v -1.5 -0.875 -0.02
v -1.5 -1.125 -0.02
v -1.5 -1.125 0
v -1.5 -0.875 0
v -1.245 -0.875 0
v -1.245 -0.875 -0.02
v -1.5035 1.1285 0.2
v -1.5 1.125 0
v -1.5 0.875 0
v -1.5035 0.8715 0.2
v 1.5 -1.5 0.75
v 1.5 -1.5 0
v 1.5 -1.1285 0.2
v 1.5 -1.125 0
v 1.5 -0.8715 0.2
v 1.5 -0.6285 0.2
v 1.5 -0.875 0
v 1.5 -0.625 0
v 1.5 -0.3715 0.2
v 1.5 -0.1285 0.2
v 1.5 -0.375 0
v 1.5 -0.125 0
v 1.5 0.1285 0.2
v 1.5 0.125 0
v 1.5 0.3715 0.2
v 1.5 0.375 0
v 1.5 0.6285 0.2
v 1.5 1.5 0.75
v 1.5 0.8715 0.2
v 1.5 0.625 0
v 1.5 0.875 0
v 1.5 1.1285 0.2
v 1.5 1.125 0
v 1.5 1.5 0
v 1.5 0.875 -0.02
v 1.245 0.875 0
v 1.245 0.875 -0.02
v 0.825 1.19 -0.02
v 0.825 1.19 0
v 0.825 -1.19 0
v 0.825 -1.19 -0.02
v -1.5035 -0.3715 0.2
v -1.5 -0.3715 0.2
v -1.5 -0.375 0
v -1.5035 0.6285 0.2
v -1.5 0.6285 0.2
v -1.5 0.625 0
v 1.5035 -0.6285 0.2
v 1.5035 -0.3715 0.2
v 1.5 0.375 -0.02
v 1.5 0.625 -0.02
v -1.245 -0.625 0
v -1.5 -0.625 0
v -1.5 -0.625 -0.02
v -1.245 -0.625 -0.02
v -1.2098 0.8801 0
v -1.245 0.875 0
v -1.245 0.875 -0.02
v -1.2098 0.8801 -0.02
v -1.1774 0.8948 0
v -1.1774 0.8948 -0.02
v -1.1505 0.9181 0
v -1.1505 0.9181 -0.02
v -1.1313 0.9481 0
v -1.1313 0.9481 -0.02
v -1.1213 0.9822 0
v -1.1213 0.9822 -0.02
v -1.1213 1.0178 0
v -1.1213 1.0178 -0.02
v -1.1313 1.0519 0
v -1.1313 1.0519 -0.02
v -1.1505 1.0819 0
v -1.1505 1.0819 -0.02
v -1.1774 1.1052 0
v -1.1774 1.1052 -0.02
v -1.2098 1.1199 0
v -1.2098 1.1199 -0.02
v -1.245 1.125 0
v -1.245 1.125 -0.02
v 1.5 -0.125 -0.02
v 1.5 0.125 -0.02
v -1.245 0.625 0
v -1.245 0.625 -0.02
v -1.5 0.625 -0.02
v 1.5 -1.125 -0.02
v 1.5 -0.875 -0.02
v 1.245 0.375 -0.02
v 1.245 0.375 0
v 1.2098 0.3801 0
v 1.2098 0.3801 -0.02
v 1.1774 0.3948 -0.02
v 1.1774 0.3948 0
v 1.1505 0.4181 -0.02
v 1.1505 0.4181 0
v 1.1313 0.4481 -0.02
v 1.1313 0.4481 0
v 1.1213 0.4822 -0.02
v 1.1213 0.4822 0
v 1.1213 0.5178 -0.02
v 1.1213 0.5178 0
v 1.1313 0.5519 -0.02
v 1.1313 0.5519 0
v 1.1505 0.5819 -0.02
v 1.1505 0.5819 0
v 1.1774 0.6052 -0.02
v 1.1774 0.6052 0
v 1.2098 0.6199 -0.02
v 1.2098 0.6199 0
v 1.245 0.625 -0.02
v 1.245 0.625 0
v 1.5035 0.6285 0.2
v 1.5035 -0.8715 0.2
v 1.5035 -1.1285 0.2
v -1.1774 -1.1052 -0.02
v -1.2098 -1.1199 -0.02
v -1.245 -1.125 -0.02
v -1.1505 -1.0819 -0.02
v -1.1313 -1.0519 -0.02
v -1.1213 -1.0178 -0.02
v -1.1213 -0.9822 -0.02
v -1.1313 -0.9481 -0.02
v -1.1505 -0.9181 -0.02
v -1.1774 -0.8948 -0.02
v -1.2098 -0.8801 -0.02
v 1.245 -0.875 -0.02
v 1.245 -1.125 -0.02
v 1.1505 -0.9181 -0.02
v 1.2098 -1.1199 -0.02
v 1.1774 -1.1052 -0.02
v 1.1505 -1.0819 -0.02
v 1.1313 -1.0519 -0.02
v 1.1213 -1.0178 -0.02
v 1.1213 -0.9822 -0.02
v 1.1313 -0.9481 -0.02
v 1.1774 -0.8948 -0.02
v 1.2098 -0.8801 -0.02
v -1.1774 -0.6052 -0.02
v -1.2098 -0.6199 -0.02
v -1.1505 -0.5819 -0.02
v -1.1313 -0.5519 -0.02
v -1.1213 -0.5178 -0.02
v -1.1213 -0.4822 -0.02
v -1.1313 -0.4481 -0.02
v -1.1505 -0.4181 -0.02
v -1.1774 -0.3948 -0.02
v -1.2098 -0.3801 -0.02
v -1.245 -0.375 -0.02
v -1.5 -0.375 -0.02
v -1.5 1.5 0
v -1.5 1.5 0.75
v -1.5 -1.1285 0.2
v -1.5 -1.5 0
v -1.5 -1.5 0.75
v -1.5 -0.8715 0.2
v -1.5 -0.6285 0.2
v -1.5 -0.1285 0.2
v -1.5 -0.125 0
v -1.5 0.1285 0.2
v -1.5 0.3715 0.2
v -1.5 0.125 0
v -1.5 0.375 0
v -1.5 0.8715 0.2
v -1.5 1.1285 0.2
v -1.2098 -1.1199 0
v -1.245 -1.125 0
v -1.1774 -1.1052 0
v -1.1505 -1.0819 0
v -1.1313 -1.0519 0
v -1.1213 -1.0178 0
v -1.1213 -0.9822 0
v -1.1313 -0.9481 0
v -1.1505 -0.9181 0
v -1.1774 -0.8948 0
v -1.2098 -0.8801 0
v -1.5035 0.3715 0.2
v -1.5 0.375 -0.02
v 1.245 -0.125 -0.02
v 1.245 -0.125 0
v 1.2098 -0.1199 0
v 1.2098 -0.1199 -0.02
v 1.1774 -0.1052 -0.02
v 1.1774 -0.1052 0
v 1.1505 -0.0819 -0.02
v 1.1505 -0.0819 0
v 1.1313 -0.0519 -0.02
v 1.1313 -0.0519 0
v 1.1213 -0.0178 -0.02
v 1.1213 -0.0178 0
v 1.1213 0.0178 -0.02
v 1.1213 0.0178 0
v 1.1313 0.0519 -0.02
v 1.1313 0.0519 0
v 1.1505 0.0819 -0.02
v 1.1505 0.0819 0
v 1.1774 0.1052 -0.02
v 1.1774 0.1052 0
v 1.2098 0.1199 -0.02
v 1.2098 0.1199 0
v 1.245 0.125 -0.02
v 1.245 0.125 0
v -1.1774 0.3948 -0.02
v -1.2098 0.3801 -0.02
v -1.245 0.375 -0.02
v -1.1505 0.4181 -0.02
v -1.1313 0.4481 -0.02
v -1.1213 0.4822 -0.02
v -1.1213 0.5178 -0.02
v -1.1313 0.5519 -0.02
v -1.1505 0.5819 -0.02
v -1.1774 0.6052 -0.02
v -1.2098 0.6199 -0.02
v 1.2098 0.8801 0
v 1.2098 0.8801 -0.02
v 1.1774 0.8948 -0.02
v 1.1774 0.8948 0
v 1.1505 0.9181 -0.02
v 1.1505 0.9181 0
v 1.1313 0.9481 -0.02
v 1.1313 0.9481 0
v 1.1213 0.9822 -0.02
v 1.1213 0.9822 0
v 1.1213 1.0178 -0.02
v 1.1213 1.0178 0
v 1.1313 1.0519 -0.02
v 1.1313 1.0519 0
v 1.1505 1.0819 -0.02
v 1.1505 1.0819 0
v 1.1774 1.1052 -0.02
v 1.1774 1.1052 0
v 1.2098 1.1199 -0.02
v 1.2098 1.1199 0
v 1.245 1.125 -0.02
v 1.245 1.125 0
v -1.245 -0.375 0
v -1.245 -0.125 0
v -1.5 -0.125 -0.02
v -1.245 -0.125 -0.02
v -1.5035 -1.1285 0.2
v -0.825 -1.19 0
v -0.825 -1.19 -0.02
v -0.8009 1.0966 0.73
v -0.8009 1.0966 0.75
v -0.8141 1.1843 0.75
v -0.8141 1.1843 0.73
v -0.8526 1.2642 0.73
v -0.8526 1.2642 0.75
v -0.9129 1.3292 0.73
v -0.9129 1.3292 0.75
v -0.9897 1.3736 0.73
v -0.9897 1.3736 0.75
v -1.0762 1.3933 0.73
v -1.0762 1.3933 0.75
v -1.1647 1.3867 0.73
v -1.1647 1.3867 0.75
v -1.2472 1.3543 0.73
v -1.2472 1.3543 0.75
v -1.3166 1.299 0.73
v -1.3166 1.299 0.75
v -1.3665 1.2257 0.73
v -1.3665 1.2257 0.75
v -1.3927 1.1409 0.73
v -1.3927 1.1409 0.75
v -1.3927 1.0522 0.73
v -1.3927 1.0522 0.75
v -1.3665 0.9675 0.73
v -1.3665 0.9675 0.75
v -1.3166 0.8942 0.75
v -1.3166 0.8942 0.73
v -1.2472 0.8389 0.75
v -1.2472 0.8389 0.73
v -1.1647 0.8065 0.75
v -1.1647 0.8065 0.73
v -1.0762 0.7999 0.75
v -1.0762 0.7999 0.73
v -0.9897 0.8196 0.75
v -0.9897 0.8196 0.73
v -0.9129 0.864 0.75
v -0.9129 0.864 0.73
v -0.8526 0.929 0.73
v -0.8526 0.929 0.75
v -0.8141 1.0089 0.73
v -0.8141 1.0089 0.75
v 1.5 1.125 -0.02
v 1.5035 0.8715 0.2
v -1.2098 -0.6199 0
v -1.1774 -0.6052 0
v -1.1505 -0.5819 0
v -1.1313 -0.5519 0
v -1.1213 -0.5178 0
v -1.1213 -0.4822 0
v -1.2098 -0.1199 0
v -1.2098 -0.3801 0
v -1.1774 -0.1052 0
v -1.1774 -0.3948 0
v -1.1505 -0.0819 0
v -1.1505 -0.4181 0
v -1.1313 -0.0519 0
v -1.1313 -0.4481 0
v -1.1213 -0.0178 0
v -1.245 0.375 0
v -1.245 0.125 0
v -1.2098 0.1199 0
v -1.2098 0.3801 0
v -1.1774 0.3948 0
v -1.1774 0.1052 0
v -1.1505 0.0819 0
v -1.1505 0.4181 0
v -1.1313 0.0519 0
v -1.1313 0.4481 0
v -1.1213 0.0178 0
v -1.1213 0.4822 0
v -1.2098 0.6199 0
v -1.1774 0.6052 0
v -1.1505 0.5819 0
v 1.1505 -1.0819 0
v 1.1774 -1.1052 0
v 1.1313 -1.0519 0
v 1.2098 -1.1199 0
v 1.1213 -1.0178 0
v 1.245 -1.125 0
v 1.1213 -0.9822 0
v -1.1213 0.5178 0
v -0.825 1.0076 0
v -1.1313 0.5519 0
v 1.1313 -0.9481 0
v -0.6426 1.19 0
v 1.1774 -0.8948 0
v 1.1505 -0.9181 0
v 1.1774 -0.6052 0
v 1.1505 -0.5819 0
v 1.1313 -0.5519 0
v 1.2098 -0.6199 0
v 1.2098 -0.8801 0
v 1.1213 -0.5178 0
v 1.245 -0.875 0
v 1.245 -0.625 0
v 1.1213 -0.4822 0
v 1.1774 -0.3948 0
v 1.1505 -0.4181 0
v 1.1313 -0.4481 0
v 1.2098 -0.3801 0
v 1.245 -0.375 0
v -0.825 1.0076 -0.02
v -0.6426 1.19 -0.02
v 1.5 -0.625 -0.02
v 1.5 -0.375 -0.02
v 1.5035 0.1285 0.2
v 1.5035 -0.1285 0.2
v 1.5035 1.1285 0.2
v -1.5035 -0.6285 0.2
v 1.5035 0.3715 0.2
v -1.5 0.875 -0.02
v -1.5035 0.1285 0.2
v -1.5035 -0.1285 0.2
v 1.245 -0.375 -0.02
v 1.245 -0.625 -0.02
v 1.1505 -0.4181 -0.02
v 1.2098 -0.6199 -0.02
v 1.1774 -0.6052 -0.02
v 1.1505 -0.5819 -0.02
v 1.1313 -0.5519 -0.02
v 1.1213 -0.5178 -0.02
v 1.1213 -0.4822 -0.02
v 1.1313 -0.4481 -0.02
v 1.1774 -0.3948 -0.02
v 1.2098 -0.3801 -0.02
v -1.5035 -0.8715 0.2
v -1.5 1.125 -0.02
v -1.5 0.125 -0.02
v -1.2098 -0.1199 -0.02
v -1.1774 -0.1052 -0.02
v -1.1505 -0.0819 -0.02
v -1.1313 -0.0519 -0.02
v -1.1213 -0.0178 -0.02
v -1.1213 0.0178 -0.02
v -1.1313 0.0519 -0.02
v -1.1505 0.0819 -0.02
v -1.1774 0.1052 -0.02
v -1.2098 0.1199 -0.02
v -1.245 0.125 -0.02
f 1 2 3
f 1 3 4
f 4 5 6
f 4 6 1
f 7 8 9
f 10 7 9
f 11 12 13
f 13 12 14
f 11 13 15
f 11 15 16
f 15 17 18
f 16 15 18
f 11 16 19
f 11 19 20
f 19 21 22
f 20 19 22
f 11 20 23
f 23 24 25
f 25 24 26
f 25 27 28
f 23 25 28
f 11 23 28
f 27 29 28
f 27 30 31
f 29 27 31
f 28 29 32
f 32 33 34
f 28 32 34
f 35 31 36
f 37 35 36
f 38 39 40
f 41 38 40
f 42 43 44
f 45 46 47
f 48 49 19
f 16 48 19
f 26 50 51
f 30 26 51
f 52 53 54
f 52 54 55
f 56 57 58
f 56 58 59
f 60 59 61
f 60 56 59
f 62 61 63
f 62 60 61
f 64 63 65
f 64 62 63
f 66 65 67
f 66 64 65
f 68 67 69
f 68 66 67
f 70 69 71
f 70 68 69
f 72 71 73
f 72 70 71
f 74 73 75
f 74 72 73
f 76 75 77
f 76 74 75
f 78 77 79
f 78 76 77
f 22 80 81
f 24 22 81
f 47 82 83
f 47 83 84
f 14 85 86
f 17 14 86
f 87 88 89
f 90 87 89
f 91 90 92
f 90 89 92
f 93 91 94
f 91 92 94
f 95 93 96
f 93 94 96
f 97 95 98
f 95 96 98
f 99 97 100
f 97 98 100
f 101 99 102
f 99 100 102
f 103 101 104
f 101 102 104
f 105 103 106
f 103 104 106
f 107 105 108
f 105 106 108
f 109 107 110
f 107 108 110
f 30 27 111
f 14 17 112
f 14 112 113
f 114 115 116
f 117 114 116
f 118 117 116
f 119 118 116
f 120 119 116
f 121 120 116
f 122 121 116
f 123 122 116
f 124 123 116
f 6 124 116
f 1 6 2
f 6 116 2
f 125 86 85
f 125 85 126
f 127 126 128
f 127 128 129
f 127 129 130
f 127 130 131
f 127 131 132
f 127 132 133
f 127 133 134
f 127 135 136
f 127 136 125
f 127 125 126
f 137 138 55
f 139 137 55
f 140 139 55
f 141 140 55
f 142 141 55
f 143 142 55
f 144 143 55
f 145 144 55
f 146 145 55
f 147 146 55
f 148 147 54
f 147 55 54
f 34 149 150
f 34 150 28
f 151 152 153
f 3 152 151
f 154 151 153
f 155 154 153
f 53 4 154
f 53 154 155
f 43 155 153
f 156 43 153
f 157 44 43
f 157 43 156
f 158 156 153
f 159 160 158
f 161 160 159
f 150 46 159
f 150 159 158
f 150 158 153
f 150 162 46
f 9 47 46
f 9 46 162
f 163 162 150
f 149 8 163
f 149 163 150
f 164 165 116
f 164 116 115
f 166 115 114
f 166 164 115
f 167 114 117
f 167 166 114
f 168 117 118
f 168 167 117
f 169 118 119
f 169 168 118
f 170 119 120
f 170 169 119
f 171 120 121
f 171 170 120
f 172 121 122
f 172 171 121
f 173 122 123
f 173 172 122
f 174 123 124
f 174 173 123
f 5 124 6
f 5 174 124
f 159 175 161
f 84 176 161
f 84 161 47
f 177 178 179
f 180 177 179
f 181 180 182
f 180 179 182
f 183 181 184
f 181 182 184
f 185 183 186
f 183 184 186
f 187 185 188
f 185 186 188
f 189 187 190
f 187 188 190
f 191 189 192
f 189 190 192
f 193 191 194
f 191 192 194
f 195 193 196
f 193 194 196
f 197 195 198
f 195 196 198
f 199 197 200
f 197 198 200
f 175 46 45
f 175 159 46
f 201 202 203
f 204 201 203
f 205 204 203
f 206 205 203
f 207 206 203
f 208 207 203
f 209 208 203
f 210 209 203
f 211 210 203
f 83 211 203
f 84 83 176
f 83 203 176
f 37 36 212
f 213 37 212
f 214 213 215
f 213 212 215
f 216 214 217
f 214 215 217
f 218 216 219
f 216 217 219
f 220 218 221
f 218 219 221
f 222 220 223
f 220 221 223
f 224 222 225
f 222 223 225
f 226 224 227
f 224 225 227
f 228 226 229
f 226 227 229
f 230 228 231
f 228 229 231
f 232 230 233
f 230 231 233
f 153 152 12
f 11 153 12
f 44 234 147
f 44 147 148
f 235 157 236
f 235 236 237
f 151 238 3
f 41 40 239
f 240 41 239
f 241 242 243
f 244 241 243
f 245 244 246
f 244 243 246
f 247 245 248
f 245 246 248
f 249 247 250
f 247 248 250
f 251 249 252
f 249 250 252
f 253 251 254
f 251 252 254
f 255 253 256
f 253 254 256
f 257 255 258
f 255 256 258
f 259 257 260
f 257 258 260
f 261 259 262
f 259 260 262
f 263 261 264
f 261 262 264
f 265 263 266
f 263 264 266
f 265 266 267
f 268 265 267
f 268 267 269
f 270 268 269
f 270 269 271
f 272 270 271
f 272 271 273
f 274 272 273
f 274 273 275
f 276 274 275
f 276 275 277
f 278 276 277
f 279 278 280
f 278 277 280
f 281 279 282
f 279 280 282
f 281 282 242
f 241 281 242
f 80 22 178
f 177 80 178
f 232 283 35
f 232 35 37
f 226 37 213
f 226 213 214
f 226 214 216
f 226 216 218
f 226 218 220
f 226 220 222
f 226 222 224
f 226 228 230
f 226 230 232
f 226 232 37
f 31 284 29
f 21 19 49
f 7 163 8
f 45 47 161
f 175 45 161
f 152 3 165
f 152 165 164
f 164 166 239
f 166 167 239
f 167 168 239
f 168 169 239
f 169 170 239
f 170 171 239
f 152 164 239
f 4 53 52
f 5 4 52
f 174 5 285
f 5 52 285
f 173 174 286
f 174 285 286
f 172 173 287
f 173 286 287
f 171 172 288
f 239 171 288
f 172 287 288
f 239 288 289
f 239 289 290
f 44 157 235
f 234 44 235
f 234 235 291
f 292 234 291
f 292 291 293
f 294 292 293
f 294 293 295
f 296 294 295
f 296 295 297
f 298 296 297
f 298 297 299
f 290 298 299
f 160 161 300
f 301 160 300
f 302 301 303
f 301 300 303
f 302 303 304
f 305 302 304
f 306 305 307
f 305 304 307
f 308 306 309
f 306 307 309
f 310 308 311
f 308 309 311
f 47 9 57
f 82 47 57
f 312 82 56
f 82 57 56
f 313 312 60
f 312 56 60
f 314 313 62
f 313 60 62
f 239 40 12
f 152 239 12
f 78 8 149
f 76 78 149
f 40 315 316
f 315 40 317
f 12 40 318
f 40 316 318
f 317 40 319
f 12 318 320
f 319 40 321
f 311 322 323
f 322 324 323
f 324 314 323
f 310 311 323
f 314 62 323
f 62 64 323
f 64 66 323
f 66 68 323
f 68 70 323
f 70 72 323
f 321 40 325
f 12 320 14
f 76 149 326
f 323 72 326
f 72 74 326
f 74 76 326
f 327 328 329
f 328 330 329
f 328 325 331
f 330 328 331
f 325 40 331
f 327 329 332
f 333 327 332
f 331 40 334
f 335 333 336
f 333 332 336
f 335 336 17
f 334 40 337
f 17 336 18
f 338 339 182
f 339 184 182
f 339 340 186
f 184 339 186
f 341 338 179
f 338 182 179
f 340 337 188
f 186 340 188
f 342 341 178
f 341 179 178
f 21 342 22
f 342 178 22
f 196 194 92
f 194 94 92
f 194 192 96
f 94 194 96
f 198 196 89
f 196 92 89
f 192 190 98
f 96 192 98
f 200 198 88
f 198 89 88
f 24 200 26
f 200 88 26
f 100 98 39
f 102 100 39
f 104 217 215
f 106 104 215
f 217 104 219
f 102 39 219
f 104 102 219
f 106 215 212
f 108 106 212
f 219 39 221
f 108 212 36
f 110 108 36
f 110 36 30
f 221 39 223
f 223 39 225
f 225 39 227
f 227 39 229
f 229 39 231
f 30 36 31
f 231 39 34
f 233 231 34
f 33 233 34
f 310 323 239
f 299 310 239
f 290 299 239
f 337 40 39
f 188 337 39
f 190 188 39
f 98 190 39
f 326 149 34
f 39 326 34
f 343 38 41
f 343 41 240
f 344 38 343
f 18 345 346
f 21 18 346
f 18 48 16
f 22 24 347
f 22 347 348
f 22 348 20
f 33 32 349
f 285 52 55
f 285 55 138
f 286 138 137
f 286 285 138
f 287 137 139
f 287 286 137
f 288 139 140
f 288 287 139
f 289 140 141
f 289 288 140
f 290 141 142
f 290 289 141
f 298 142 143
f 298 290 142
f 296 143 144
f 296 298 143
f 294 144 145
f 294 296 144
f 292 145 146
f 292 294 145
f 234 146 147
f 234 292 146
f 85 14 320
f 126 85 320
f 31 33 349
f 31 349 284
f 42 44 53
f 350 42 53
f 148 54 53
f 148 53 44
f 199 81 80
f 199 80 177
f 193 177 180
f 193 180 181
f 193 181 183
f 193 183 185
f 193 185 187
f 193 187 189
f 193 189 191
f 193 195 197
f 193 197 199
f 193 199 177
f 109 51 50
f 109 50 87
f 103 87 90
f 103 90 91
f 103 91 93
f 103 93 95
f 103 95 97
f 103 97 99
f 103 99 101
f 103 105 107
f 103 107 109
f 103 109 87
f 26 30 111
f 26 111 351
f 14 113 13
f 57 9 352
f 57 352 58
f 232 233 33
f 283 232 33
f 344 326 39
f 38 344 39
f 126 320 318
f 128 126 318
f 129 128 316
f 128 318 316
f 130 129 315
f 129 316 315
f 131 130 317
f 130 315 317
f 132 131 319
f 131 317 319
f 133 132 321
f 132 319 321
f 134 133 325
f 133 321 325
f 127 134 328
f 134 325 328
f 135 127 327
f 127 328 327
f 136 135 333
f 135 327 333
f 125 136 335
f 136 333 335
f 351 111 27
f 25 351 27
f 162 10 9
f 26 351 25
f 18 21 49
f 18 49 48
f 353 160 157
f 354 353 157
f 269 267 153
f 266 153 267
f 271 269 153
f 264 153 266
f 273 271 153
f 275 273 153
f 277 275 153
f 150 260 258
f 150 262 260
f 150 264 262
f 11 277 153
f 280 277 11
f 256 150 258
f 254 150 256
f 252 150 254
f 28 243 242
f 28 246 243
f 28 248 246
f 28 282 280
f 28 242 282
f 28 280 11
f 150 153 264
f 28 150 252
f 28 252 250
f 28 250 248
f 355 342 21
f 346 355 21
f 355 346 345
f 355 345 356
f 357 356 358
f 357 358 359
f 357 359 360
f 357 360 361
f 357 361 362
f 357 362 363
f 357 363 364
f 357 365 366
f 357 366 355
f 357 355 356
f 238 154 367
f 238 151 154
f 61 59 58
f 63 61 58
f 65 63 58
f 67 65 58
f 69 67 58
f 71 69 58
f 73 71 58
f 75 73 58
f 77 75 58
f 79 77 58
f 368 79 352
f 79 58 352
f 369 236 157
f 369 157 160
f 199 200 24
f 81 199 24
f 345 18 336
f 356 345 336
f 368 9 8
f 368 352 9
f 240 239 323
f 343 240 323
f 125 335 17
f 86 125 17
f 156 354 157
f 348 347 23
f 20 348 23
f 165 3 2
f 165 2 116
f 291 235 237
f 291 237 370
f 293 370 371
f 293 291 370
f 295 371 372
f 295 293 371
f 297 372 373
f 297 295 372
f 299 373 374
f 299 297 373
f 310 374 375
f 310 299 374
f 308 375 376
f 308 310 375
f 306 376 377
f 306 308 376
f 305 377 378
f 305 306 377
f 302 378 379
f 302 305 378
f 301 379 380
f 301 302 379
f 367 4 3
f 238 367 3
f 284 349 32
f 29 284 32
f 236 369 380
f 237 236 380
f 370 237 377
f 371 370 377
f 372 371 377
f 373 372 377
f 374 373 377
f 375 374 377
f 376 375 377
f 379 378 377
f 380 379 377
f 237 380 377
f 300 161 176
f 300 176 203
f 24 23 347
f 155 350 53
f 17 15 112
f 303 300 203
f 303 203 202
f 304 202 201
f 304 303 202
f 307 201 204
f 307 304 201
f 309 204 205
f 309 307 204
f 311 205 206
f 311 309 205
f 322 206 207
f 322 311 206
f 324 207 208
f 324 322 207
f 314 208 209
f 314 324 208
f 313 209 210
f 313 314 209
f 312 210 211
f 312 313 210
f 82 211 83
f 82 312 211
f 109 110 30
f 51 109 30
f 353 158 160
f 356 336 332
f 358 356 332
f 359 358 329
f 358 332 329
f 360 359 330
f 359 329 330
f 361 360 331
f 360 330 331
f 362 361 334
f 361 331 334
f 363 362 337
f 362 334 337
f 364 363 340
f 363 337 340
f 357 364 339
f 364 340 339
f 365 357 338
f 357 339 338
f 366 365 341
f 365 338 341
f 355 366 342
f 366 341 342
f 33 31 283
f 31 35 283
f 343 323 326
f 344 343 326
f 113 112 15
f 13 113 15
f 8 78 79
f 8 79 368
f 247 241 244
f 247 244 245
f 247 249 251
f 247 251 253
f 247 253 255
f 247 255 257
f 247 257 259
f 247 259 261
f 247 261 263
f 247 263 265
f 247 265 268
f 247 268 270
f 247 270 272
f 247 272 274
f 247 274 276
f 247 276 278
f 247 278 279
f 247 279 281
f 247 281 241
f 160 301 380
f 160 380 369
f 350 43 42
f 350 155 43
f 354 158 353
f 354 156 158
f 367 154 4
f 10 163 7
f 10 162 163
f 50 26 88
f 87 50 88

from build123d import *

# Parameters (mm, degrees)
SKETCH1_W                     = 3
SKETCH1_H                     = 3
BOSS_EXTRUDE1_DEPTH           = 0.75
SKETCH2_R                     = 0.297554852
CUT_EXTRUDE1_DEPTH            = 0.02
BOSS_EXTRUDE2_DEPTH           = 0.02
BOSS_EXTRUDE3_DEPTH           = 0.02
BOSS_EXTRUDE3_OTHER_WAY_DEPTH = 0.2
BOSS_EXTRUDE3_OTHER_WAY_DRAFT = 1
LPATTERN2_COUNT               = 3
LPATTERN2_PITCH               = 0.5
LPATTERN2_COPY_1_DEPTH        = 0.2
LPATTERN2_COPY_1_DRAFT        = 1
LPATTERN2_COPY_2_DEPTH        = 0.2
LPATTERN2_COPY_2_DRAFT        = 1
LPATTERN2_COPY_3_DEPTH        = 0.2
LPATTERN2_COPY_3_DRAFT        = 1
LPATTERN2_COPY_4_DEPTH        = 0.2
LPATTERN2_COPY_4_DRAFT        = 1
LPATTERN2_COL_COUNT           = 3
LPATTERN2_COL_PITCH           = 0.5
LPATTERN2_COL_COPY_1_DEPTH    = 0.2
LPATTERN2_COL_COPY_1_DRAFT    = 1
LPATTERN2_COL_COPY_2_DEPTH    = 0.2
LPATTERN2_COL_COPY_2_DRAFT    = 1
LPATTERN2_COL_COPY_3_DEPTH    = 0.2
LPATTERN2_COL_COPY_3_DRAFT    = 1
LPATTERN2_COL_COPY_4_DEPTH    = 0.2
LPATTERN2_COL_COPY_4_DRAFT    = 1
MIRROR1_COPY_1_DEPTH          = 0.2
MIRROR1_COPY_1_DRAFT          = 1
MIRROR1_COPY_2_DEPTH          = 0.2
MIRROR1_COPY_2_DRAFT          = 1
MIRROR1_COPY_3_DEPTH          = 0.02
MIRROR1_COPY_4_DEPTH          = 0.02
MIRROR1_COPY_5_DEPTH          = 0.2
MIRROR1_COPY_5_DRAFT          = 1
MIRROR1_COPY_6_DEPTH          = 0.2
MIRROR1_COPY_6_DRAFT          = 1
MIRROR1_COPY_7_DEPTH          = 0.2
MIRROR1_COPY_7_DRAFT          = 1
MIRROR1_COPY_8_DEPTH          = 0.2
MIRROR1_COPY_8_DRAFT          = 1
MIRROR1_COPY_9_DEPTH          = 0.02
MIRROR1_COPY_10_DEPTH         = 0.02
MIRROR1_COPY_11_DEPTH         = 0.2
MIRROR1_COPY_11_DRAFT         = 1
MIRROR1_COPY_12_DEPTH         = 0.2
MIRROR1_COPY_12_DRAFT         = 1
MIRROR1_COPY_13_DEPTH         = 0.2
MIRROR1_COPY_13_DRAFT         = 1
MIRROR1_COPY_14_DEPTH         = 0.2
MIRROR1_COPY_14_DRAFT         = 1
MIRROR1_COPY_15_DEPTH         = 0.2
MIRROR1_COPY_15_DRAFT         = 1


with BuildPart() as part:
    # Sketch1 → Boss-Extrude1 (new body)
    with BuildSketch(Plane.XY):
        Rectangle(SKETCH1_W, SKETCH1_H)
    extrude(amount=BOSS_EXTRUDE1_DEPTH)

    # Sketch2 → Cut-Extrude1 (cut)
    with BuildSketch(Plane.XY.offset(0.75)):
        with Locations((-1.098438597, 1.096593323)):
            Circle(SKETCH2_R)
    extrude(amount=-CUT_EXTRUDE1_DEPTH, mode=Mode.SUBTRACT)

    # Sketch3 → Boss-Extrude2 (add)
    with BuildSketch(Plane(origin=(0, 0, 0), x_dir=(-1, 0, 0), z_dir=(0, 0, -1))):
        Polygon((0.825, 1.007619321), (0.642619321, 1.19), (-0.825, 1.19), (-0.825, -1.19), (0.825, -1.19), align=None)
    extrude(amount=BOSS_EXTRUDE2_DEPTH)

    # Sketch4 → Boss-Extrude3 (add)
    with BuildSketch(Plane(origin=(0, 0, 0), x_dir=(-1, 0, 0), z_dir=(0, 0, -1))):
        with BuildLine():
            Line((-1.5, 0.125), (-1.5, -0.125))
            Line((-1.5, -0.125), (-1.245, -0.125))
            ThreePointArc((-1.245, -0.125), (-1.12, 0), (-1.245, 0.125))
            Line((-1.245, 0.125), (-1.5, 0.125))
        make_face()
    boss_extrude3 = extrude(amount=BOSS_EXTRUDE3_DEPTH)


with BuildPart() as boss_extrude3_other_way_tool:
    # Sketch4 → Boss-Extrude3 other way (with draft: the straight prism first)
    with BuildSketch(Plane(origin=(0, 0, 0), x_dir=(-1, 0, 0), z_dir=(0, 0, -1))):
        with BuildLine():
            Line((-1.5, 0.125), (-1.5, -0.125))
            Line((-1.5, -0.125), (-1.245, -0.125))
            ThreePointArc((-1.245, -0.125), (-1.12, 0), (-1.245, 0.125))
            Line((-1.245, 0.125), (-1.5, 0.125))
        make_face()
    extrude(amount=-BOSS_EXTRUDE3_OTHER_WAY_DEPTH)
    # Boss-Extrude3 other way: the draft: its side faces are tilted about the plane it starts from
    boss_extrude3_other_way_sides = [boss_extrude3_other_way_tool.faces().sort_by_distance(p)[0] for p in [
        (1.3725, 0.125, 0.1),
        (1.5, 0, 0.1),
        (1.3725, -0.125, 0.1),
        (1.12, 0, 0.1),
    ]]
    draft(boss_extrude3_other_way_sides, Plane(origin=(0, 0, 0), x_dir=(-1, 0, 0), z_dir=(0, 0, -1)), BOSS_EXTRUDE3_OTHER_WAY_DRAFT)


with BuildPart() as part_1:
    add(part.part)

    # Boss-Extrude3 other way: add boss_extrude3_other_way_tool
    add(boss_extrude3_other_way_tool.part)

    # LPattern2: Boss-Extrude3 ×3
    with Locations(*[(0, i * LPATTERN2_PITCH, 0) for i in range(1, LPATTERN2_COUNT)]):
        add(boss_extrude3)


with BuildPart() as lpattern2_copy_1_tool:
    # LPattern2 copy 1 sketch → LPattern2 copy 1 (with draft: the straight prism first)
    with BuildSketch(Plane(origin=(0, 0.5, 0), x_dir=(-1, 0, 0), z_dir=(0, 0, -1))):
        with BuildLine():
            Line((-1.5, 0.125), (-1.5, -0.125))
            Line((-1.5, -0.125), (-1.245, -0.125))
            ThreePointArc((-1.245, -0.125), (-1.12, 0), (-1.245, 0.125))
            Line((-1.245, 0.125), (-1.5, 0.125))
        make_face()
    extrude(amount=-LPATTERN2_COPY_1_DEPTH)
    # LPattern2 copy 1: the draft: its side faces are tilted about the plane it starts from
    lpattern2_copy_1_sides = [lpattern2_copy_1_tool.faces().sort_by_distance(p)[0] for p in [
        (1.3725, 0.625, 0.1),
        (1.5, 0.5, 0.1),
        (1.3725, 0.375, 0.1),
        (1.12, 0.5, 0.1),
    ]]
    draft(lpattern2_copy_1_sides, Plane(origin=(0, 0.5, 0), x_dir=(-1, 0, 0), z_dir=(0, 0, -1)), LPATTERN2_COPY_1_DRAFT)


with BuildPart() as part_2:
    add(part_1.part)

    # LPattern2 copy 1: add lpattern2_copy_1_tool
    add(lpattern2_copy_1_tool.part)


with BuildPart() as lpattern2_copy_2_tool:
    # LPattern2 copy 2 sketch → LPattern2 copy 2 (with draft: the straight prism first)
    with BuildSketch(Plane(origin=(0, 1, 0), x_dir=(-1, 0, 0), z_dir=(0, 0, -1))):
        with BuildLine():
            Line((-1.5, 0.125), (-1.5, -0.125))
            Line((-1.5, -0.125), (-1.245, -0.125))
            ThreePointArc((-1.245, -0.125), (-1.12, 0), (-1.245, 0.125))
            Line((-1.245, 0.125), (-1.5, 0.125))
        make_face()
    extrude(amount=-LPATTERN2_COPY_2_DEPTH)
    # LPattern2 copy 2: the draft: its side faces are tilted about the plane it starts from
    lpattern2_copy_2_sides = [lpattern2_copy_2_tool.faces().sort_by_distance(p)[0] for p in [
        (1.3725, 1.125, 0.1),
        (1.5, 1, 0.1),
        (1.3725, 0.875, 0.1),
        (1.12, 1, 0.1),
    ]]
    draft(lpattern2_copy_2_sides, Plane(origin=(0, 1, 0), x_dir=(-1, 0, 0), z_dir=(0, 0, -1)), LPATTERN2_COPY_2_DRAFT)


with BuildPart() as part_3:
    add(part_2.part)

    # LPattern2 copy 2: add lpattern2_copy_2_tool
    add(lpattern2_copy_2_tool.part)


with BuildPart() as lpattern2_copy_3_tool:
    # LPattern2 copy 3 sketch → LPattern2 copy 3 (with draft: the straight prism first)
    with BuildSketch(Plane(origin=(0, 0.5, 0), x_dir=(-1, 0, 0), z_dir=(0, 0, -1))):
        with BuildLine():
            Line((-1.5, 0.125), (-1.5, -0.125))
            Line((-1.5, -0.125), (-1.245, -0.125))
            ThreePointArc((-1.245, -0.125), (-1.12, 0), (-1.245, 0.125))
            Line((-1.245, 0.125), (-1.5, 0.125))
        make_face()
    extrude(amount=-LPATTERN2_COPY_3_DEPTH)
    # LPattern2 copy 3: the draft: its side faces are tilted about the plane it starts from
    lpattern2_copy_3_sides = [lpattern2_copy_3_tool.faces().sort_by_distance(p)[0] for p in [
        (1.3725, 0.625, 0.1),
        (1.5, 0.5, 0.1),
        (1.3725, 0.375, 0.1),
        (1.12, 0.5, 0.1),
    ]]
    draft(lpattern2_copy_3_sides, Plane(origin=(0, 0.5, 0), x_dir=(-1, 0, 0), z_dir=(0, 0, -1)), LPATTERN2_COPY_3_DRAFT)


with BuildPart() as part_4:
    add(part_3.part)

    # LPattern2 copy 3: add lpattern2_copy_3_tool
    add(lpattern2_copy_3_tool.part)


with BuildPart() as lpattern2_copy_4_tool:
    # LPattern2 copy 4 sketch → LPattern2 copy 4 (with draft: the straight prism first)
    with BuildSketch(Plane(origin=(0, 1, 0), x_dir=(-1, 0, 0), z_dir=(0, 0, -1))):
        with BuildLine():
            Line((-1.5, 0.125), (-1.5, -0.125))
            Line((-1.5, -0.125), (-1.245, -0.125))
            ThreePointArc((-1.245, -0.125), (-1.12, 0), (-1.245, 0.125))
            Line((-1.245, 0.125), (-1.5, 0.125))
        make_face()
    extrude(amount=-LPATTERN2_COPY_4_DEPTH)
    # LPattern2 copy 4: the draft: its side faces are tilted about the plane it starts from
    lpattern2_copy_4_sides = [lpattern2_copy_4_tool.faces().sort_by_distance(p)[0] for p in [
        (1.3725, 1.125, 0.1),
        (1.5, 1, 0.1),
        (1.3725, 0.875, 0.1),
        (1.12, 1, 0.1),
    ]]
    draft(lpattern2_copy_4_sides, Plane(origin=(0, 1, 0), x_dir=(-1, 0, 0), z_dir=(0, 0, -1)), LPATTERN2_COPY_4_DRAFT)


with BuildPart() as part_5:
    add(part_4.part)

    # LPattern2 copy 4: add lpattern2_copy_4_tool
    add(lpattern2_copy_4_tool.part)

    # LPattern2 col: Boss-Extrude3 ×3
    with Locations(*[(0, -i * LPATTERN2_COL_PITCH, 0) for i in range(1, LPATTERN2_COL_COUNT)]):
        add(boss_extrude3)


with BuildPart() as lpattern2_col_copy_1_tool:
    # LPattern2 col copy 1 sketch → LPattern2 col copy 1 (with draft: the straight prism first)
    with BuildSketch(Plane(origin=(0, -0.5, 0), x_dir=(-1, 0, 0), z_dir=(0, 0, -1))):
        with BuildLine():
            Line((-1.5, 0.125), (-1.5, -0.125))
            Line((-1.5, -0.125), (-1.245, -0.125))
            ThreePointArc((-1.245, -0.125), (-1.12, 0), (-1.245, 0.125))
            Line((-1.245, 0.125), (-1.5, 0.125))
        make_face()
    extrude(amount=-LPATTERN2_COL_COPY_1_DEPTH)
    # LPattern2 col copy 1: the draft: its side faces are tilted about the plane it starts from
    lpattern2_col_copy_1_sides = [lpattern2_col_copy_1_tool.faces().sort_by_distance(p)[0] for p in [
        (1.3725, -0.375, 0.1),
        (1.5, -0.5, 0.1),
        (1.3725, -0.625, 0.1),
        (1.12, -0.5, 0.1),
    ]]
    draft(lpattern2_col_copy_1_sides, Plane(origin=(0, -0.5, 0), x_dir=(-1, 0, 0), z_dir=(0, 0, -1)), LPATTERN2_COL_COPY_1_DRAFT)


with BuildPart() as part_6:
    add(part_5.part)

    # LPattern2 col copy 1: add lpattern2_col_copy_1_tool
    add(lpattern2_col_copy_1_tool.part)


with BuildPart() as lpattern2_col_copy_2_tool:
    # LPattern2 col copy 2 sketch → LPattern2 col copy 2 (with draft: the straight prism first)
    with BuildSketch(Plane(origin=(0, -1, 0), x_dir=(-1, 0, 0), z_dir=(0, 0, -1))):
        with BuildLine():
            Line((-1.5, 0.125), (-1.5, -0.125))
            Line((-1.5, -0.125), (-1.245, -0.125))
            ThreePointArc((-1.245, -0.125), (-1.12, 0), (-1.245, 0.125))
            Line((-1.245, 0.125), (-1.5, 0.125))
        make_face()
    extrude(amount=-LPATTERN2_COL_COPY_2_DEPTH)
    # LPattern2 col copy 2: the draft: its side faces are tilted about the plane it starts from
    lpattern2_col_copy_2_sides = [lpattern2_col_copy_2_tool.faces().sort_by_distance(p)[0] for p in [
        (1.3725, -0.875, 0.1),
        (1.5, -1, 0.1),
        (1.3725, -1.125, 0.1),
        (1.12, -1, 0.1),
    ]]
    draft(lpattern2_col_copy_2_sides, Plane(origin=(0, -1, 0), x_dir=(-1, 0, 0), z_dir=(0, 0, -1)), LPATTERN2_COL_COPY_2_DRAFT)


with BuildPart() as part_7:
    add(part_6.part)

    # LPattern2 col copy 2: add lpattern2_col_copy_2_tool
    add(lpattern2_col_copy_2_tool.part)


with BuildPart() as lpattern2_col_copy_3_tool:
    # LPattern2 col copy 3 sketch → LPattern2 col copy 3 (with draft: the straight prism first)
    with BuildSketch(Plane(origin=(0, -0.5, 0), x_dir=(-1, 0, 0), z_dir=(0, 0, -1))):
        with BuildLine():
            Line((-1.5, 0.125), (-1.5, -0.125))
            Line((-1.5, -0.125), (-1.245, -0.125))
            ThreePointArc((-1.245, -0.125), (-1.12, 0), (-1.245, 0.125))
            Line((-1.245, 0.125), (-1.5, 0.125))
        make_face()
    extrude(amount=-LPATTERN2_COL_COPY_3_DEPTH)
    # LPattern2 col copy 3: the draft: its side faces are tilted about the plane it starts from
    lpattern2_col_copy_3_sides = [lpattern2_col_copy_3_tool.faces().sort_by_distance(p)[0] for p in [
        (1.3725, -0.375, 0.1),
        (1.5, -0.5, 0.1),
        (1.3725, -0.625, 0.1),
        (1.12, -0.5, 0.1),
    ]]
    draft(lpattern2_col_copy_3_sides, Plane(origin=(0, -0.5, 0), x_dir=(-1, 0, 0), z_dir=(0, 0, -1)), LPATTERN2_COL_COPY_3_DRAFT)


with BuildPart() as part_8:
    add(part_7.part)

    # LPattern2 col copy 3: add lpattern2_col_copy_3_tool
    add(lpattern2_col_copy_3_tool.part)


with BuildPart() as lpattern2_col_copy_4_tool:
    # LPattern2 col copy 4 sketch → LPattern2 col copy 4 (with draft: the straight prism first)
    with BuildSketch(Plane(origin=(0, -1, 0), x_dir=(-1, 0, 0), z_dir=(0, 0, -1))):
        with BuildLine():
            Line((-1.5, 0.125), (-1.5, -0.125))
            Line((-1.5, -0.125), (-1.245, -0.125))
            ThreePointArc((-1.245, -0.125), (-1.12, 0), (-1.245, 0.125))
            Line((-1.245, 0.125), (-1.5, 0.125))
        make_face()
    extrude(amount=-LPATTERN2_COL_COPY_4_DEPTH)
    # LPattern2 col copy 4: the draft: its side faces are tilted about the plane it starts from
    lpattern2_col_copy_4_sides = [lpattern2_col_copy_4_tool.faces().sort_by_distance(p)[0] for p in [
        (1.3725, -0.875, 0.1),
        (1.5, -1, 0.1),
        (1.3725, -1.125, 0.1),
        (1.12, -1, 0.1),
    ]]
    draft(lpattern2_col_copy_4_sides, Plane(origin=(0, -1, 0), x_dir=(-1, 0, 0), z_dir=(0, 0, -1)), LPATTERN2_COL_COPY_4_DRAFT)


with BuildPart() as part_9:
    add(part_8.part)

    # LPattern2 col copy 4: add lpattern2_col_copy_4_tool
    add(lpattern2_col_copy_4_tool.part)

    # Mirror1: Boss-Extrude3 across plane
    add(boss_extrude3.mirror(Plane(origin=(0, 0, 0), x_dir=(0, 0, 1), z_dir=(1, 0, 0))))


with BuildPart() as mirror1_copy_1_tool:
    # Mirror1 copy 1 sketch → Mirror1 copy 1 (with draft: the straight prism first)
    with BuildSketch(Plane(origin=(0, 0, 0), x_dir=(1, 0, 0), z_dir=(0, 0, -1))):
        with BuildLine():
            Line((-1.5, -0.125), (-1.5, 0.125))
            Line((-1.5, 0.125), (-1.245, 0.125))
            ThreePointArc((-1.245, 0.125), (-1.12, 0), (-1.245, -0.125))
            Line((-1.245, -0.125), (-1.5, -0.125))
        make_face()
    extrude(amount=-MIRROR1_COPY_1_DEPTH)
    # Mirror1 copy 1: the draft: its side faces are tilted about the plane it starts from
    mirror1_copy_1_sides = [mirror1_copy_1_tool.faces().sort_by_distance(p)[0] for p in [
        (-1.3725, 0.125, 0.1),
        (-1.5, 0, 0.1),
        (-1.3725, -0.125, 0.1),
        (-1.12, 0, 0.1),
    ]]
    draft(mirror1_copy_1_sides, Plane(origin=(0, 0, 0), x_dir=(1, 0, 0), z_dir=(0, 0, -1)), MIRROR1_COPY_1_DRAFT)


with BuildPart() as part_10:
    add(part_9.part)

    # Mirror1 copy 1: add mirror1_copy_1_tool
    add(mirror1_copy_1_tool.part)


with BuildPart() as mirror1_copy_2_tool:
    # Mirror1 copy 2 sketch → Mirror1 copy 2 (with draft: the straight prism first)
    with BuildSketch(Plane(origin=(0, 0, 0), x_dir=(1, 0, 0), z_dir=(0, 0, -1))):
        with BuildLine():
            Line((-1.5, -0.125), (-1.5, 0.125))
            Line((-1.5, 0.125), (-1.245, 0.125))
            ThreePointArc((-1.245, 0.125), (-1.12, 0), (-1.245, -0.125))
            Line((-1.245, -0.125), (-1.5, -0.125))
        make_face()
    extrude(amount=-MIRROR1_COPY_2_DEPTH)
    # Mirror1 copy 2: the draft: its side faces are tilted about the plane it starts from
    mirror1_copy_2_sides = [mirror1_copy_2_tool.faces().sort_by_distance(p)[0] for p in [
        (-1.3725, 0.125, 0.1),
        (-1.5, 0, 0.1),
        (-1.3725, -0.125, 0.1),
        (-1.12, 0, 0.1),
    ]]
    draft(mirror1_copy_2_sides, Plane(origin=(0, 0, 0), x_dir=(1, 0, 0), z_dir=(0, 0, -1)), MIRROR1_COPY_2_DRAFT)


with BuildPart() as part_11:
    add(part_10.part)

    # Mirror1 copy 2: add mirror1_copy_2_tool
    add(mirror1_copy_2_tool.part)

    # Mirror1 copy 3 sketch → Mirror1 copy 3 (add)
    with BuildSketch(Plane(origin=(0, 0.5, 0), x_dir=(1, 0, 0), z_dir=(0, 0, -1))):
        with BuildLine():
            Line((-1.5, -0.125), (-1.5, 0.125))
            Line((-1.5, 0.125), (-1.245, 0.125))
            ThreePointArc((-1.245, 0.125), (-1.12, 0), (-1.245, -0.125))
            Line((-1.245, -0.125), (-1.5, -0.125))
        make_face()
    extrude(amount=MIRROR1_COPY_3_DEPTH)

    # Mirror1 copy 4 sketch → Mirror1 copy 4 (add)
    with BuildSketch(Plane(origin=(0, 1, 0), x_dir=(1, 0, 0), z_dir=(0, 0, -1))):
        with BuildLine():
            Line((-1.5, -0.125), (-1.5, 0.125))
            Line((-1.5, 0.125), (-1.245, 0.125))
            ThreePointArc((-1.245, 0.125), (-1.12, 0), (-1.245, -0.125))
            Line((-1.245, -0.125), (-1.5, -0.125))
        make_face()
    extrude(amount=MIRROR1_COPY_4_DEPTH)


with BuildPart() as mirror1_copy_5_tool:
    # Mirror1 copy 5 sketch → Mirror1 copy 5 (with draft: the straight prism first)
    with BuildSketch(Plane(origin=(0, 0.5, 0), x_dir=(1, 0, 0), z_dir=(0, 0, -1))):
        with BuildLine():
            Line((-1.5, -0.125), (-1.5, 0.125))
            Line((-1.5, 0.125), (-1.245, 0.125))
            ThreePointArc((-1.245, 0.125), (-1.12, 0), (-1.245, -0.125))
            Line((-1.245, -0.125), (-1.5, -0.125))
        make_face()
    extrude(amount=-MIRROR1_COPY_5_DEPTH)
    # Mirror1 copy 5: the draft: its side faces are tilted about the plane it starts from
    mirror1_copy_5_sides = [mirror1_copy_5_tool.faces().sort_by_distance(p)[0] for p in [
        (-1.3725, 0.625, 0.1),
        (-1.5, 0.5, 0.1),
        (-1.3725, 0.375, 0.1),
        (-1.12, 0.5, 0.1),
    ]]
    draft(mirror1_copy_5_sides, Plane(origin=(0, 0.5, 0), x_dir=(1, 0, 0), z_dir=(0, 0, -1)), MIRROR1_COPY_5_DRAFT)


with BuildPart() as part_12:
    add(part_11.part)

    # Mirror1 copy 5: add mirror1_copy_5_tool
    add(mirror1_copy_5_tool.part)


with BuildPart() as mirror1_copy_6_tool:
    # Mirror1 copy 6 sketch → Mirror1 copy 6 (with draft: the straight prism first)
    with BuildSketch(Plane(origin=(0, 1, 0), x_dir=(1, 0, 0), z_dir=(0, 0, -1))):
        with BuildLine():
            Line((-1.5, -0.125), (-1.5, 0.125))
            Line((-1.5, 0.125), (-1.245, 0.125))
            ThreePointArc((-1.245, 0.125), (-1.12, 0), (-1.245, -0.125))
            Line((-1.245, -0.125), (-1.5, -0.125))
        make_face()
    extrude(amount=-MIRROR1_COPY_6_DEPTH)
    # Mirror1 copy 6: the draft: its side faces are tilted about the plane it starts from
    mirror1_copy_6_sides = [mirror1_copy_6_tool.faces().sort_by_distance(p)[0] for p in [
        (-1.3725, 1.125, 0.1),
        (-1.5, 1, 0.1),
        (-1.3725, 0.875, 0.1),
        (-1.12, 1, 0.1),
    ]]
    draft(mirror1_copy_6_sides, Plane(origin=(0, 1, 0), x_dir=(1, 0, 0), z_dir=(0, 0, -1)), MIRROR1_COPY_6_DRAFT)


with BuildPart() as part_13:
    add(part_12.part)

    # Mirror1 copy 6: add mirror1_copy_6_tool
    add(mirror1_copy_6_tool.part)


with BuildPart() as mirror1_copy_7_tool:
    # Mirror1 copy 7 sketch → Mirror1 copy 7 (with draft: the straight prism first)
    with BuildSketch(Plane(origin=(0, 0.5, 0), x_dir=(1, 0, 0), z_dir=(0, 0, -1))):
        with BuildLine():
            Line((-1.5, -0.125), (-1.5, 0.125))
            Line((-1.5, 0.125), (-1.245, 0.125))
            ThreePointArc((-1.245, 0.125), (-1.12, 0), (-1.245, -0.125))
            Line((-1.245, -0.125), (-1.5, -0.125))
        make_face()
    extrude(amount=-MIRROR1_COPY_7_DEPTH)
    # Mirror1 copy 7: the draft: its side faces are tilted about the plane it starts from
    mirror1_copy_7_sides = [mirror1_copy_7_tool.faces().sort_by_distance(p)[0] for p in [
        (-1.3725, 0.625, 0.1),
        (-1.5, 0.5, 0.1),
        (-1.3725, 0.375, 0.1),
        (-1.12, 0.5, 0.1),
    ]]
    draft(mirror1_copy_7_sides, Plane(origin=(0, 0.5, 0), x_dir=(1, 0, 0), z_dir=(0, 0, -1)), MIRROR1_COPY_7_DRAFT)


with BuildPart() as part_14:
    add(part_13.part)

    # Mirror1 copy 7: add mirror1_copy_7_tool
    add(mirror1_copy_7_tool.part)


with BuildPart() as mirror1_copy_8_tool:
    # Mirror1 copy 8 sketch → Mirror1 copy 8 (with draft: the straight prism first)
    with BuildSketch(Plane(origin=(0, 1, 0), x_dir=(1, 0, 0), z_dir=(0, 0, -1))):
        with BuildLine():
            Line((-1.5, -0.125), (-1.5, 0.125))
            Line((-1.5, 0.125), (-1.245, 0.125))
            ThreePointArc((-1.245, 0.125), (-1.12, 0), (-1.245, -0.125))
            Line((-1.245, -0.125), (-1.5, -0.125))
        make_face()
    extrude(amount=-MIRROR1_COPY_8_DEPTH)
    # Mirror1 copy 8: the draft: its side faces are tilted about the plane it starts from
    mirror1_copy_8_sides = [mirror1_copy_8_tool.faces().sort_by_distance(p)[0] for p in [
        (-1.3725, 1.125, 0.1),
        (-1.5, 1, 0.1),
        (-1.3725, 0.875, 0.1),
        (-1.12, 1, 0.1),
    ]]
    draft(mirror1_copy_8_sides, Plane(origin=(0, 1, 0), x_dir=(1, 0, 0), z_dir=(0, 0, -1)), MIRROR1_COPY_8_DRAFT)


with BuildPart() as part_15:
    add(part_14.part)

    # Mirror1 copy 8: add mirror1_copy_8_tool
    add(mirror1_copy_8_tool.part)

    # Mirror1 copy 9 sketch → Mirror1 copy 9 (add)
    with BuildSketch(Plane(origin=(0, -0.5, 0), x_dir=(1, 0, 0), z_dir=(0, 0, -1))):
        with BuildLine():
            Line((-1.5, -0.125), (-1.5, 0.125))
            Line((-1.5, 0.125), (-1.245, 0.125))
            ThreePointArc((-1.245, 0.125), (-1.12, 0), (-1.245, -0.125))
            Line((-1.245, -0.125), (-1.5, -0.125))
        make_face()
    extrude(amount=MIRROR1_COPY_9_DEPTH)

    # Mirror1 copy 10 sketch → Mirror1 copy 10 (add)
    with BuildSketch(Plane(origin=(0, -1, 0), x_dir=(1, 0, 0), z_dir=(0, 0, -1))):
        with BuildLine():
            Line((-1.5, -0.125), (-1.5, 0.125))
            Line((-1.5, 0.125), (-1.245, 0.125))
            ThreePointArc((-1.245, 0.125), (-1.12, 0), (-1.245, -0.125))
            Line((-1.245, -0.125), (-1.5, -0.125))
        make_face()
    extrude(amount=MIRROR1_COPY_10_DEPTH)


with BuildPart() as mirror1_copy_11_tool:
    # Mirror1 copy 11 sketch → Mirror1 copy 11 (with draft: the straight prism first)
    with BuildSketch(Plane(origin=(0, -0.5, 0), x_dir=(1, 0, 0), z_dir=(0, 0, -1))):
        with BuildLine():
            Line((-1.5, -0.125), (-1.5, 0.125))
            Line((-1.5, 0.125), (-1.245, 0.125))
            ThreePointArc((-1.245, 0.125), (-1.12, 0), (-1.245, -0.125))
            Line((-1.245, -0.125), (-1.5, -0.125))
        make_face()
    extrude(amount=-MIRROR1_COPY_11_DEPTH)
    # Mirror1 copy 11: the draft: its side faces are tilted about the plane it starts from
    mirror1_copy_11_sides = [mirror1_copy_11_tool.faces().sort_by_distance(p)[0] for p in [
        (-1.3725, -0.375, 0.1),
        (-1.5, -0.5, 0.1),
        (-1.3725, -0.625, 0.1),
        (-1.12, -0.5, 0.1),
    ]]
    draft(mirror1_copy_11_sides, Plane(origin=(0, -0.5, 0), x_dir=(1, 0, 0), z_dir=(0, 0, -1)), MIRROR1_COPY_11_DRAFT)


with BuildPart() as part_16:
    add(part_15.part)

    # Mirror1 copy 11: add mirror1_copy_11_tool
    add(mirror1_copy_11_tool.part)


with BuildPart() as mirror1_copy_12_tool:
    # Mirror1 copy 12 sketch → Mirror1 copy 12 (with draft: the straight prism first)
    with BuildSketch(Plane(origin=(0, -1, 0), x_dir=(1, 0, 0), z_dir=(0, 0, -1))):
        with BuildLine():
            Line((-1.5, -0.125), (-1.5, 0.125))
            Line((-1.5, 0.125), (-1.245, 0.125))
            ThreePointArc((-1.245, 0.125), (-1.12, 0), (-1.245, -0.125))
            Line((-1.245, -0.125), (-1.5, -0.125))
        make_face()
    extrude(amount=-MIRROR1_COPY_12_DEPTH)
    # Mirror1 copy 12: the draft: its side faces are tilted about the plane it starts from
    mirror1_copy_12_sides = [mirror1_copy_12_tool.faces().sort_by_distance(p)[0] for p in [
        (-1.3725, -0.875, 0.1),
        (-1.5, -1, 0.1),
        (-1.3725, -1.125, 0.1),
        (-1.12, -1, 0.1),
    ]]
    draft(mirror1_copy_12_sides, Plane(origin=(0, -1, 0), x_dir=(1, 0, 0), z_dir=(0, 0, -1)), MIRROR1_COPY_12_DRAFT)


with BuildPart() as part_17:
    add(part_16.part)

    # Mirror1 copy 12: add mirror1_copy_12_tool
    add(mirror1_copy_12_tool.part)


with BuildPart() as mirror1_copy_13_tool:
    # Mirror1 copy 13 sketch → Mirror1 copy 13 (with draft: the straight prism first)
    with BuildSketch(Plane(origin=(0, -0.5, 0), x_dir=(1, 0, 0), z_dir=(0, 0, -1))):
        with BuildLine():
            Line((-1.5, -0.125), (-1.5, 0.125))
            Line((-1.5, 0.125), (-1.245, 0.125))
            ThreePointArc((-1.245, 0.125), (-1.12, 0), (-1.245, -0.125))
            Line((-1.245, -0.125), (-1.5, -0.125))
        make_face()
    extrude(amount=-MIRROR1_COPY_13_DEPTH)
    # Mirror1 copy 13: the draft: its side faces are tilted about the plane it starts from
    mirror1_copy_13_sides = [mirror1_copy_13_tool.faces().sort_by_distance(p)[0] for p in [
        (-1.3725, -0.375, 0.1),
        (-1.5, -0.5, 0.1),
        (-1.3725, -0.625, 0.1),
        (-1.12, -0.5, 0.1),
    ]]
    draft(mirror1_copy_13_sides, Plane(origin=(0, -0.5, 0), x_dir=(1, 0, 0), z_dir=(0, 0, -1)), MIRROR1_COPY_13_DRAFT)


with BuildPart() as part_18:
    add(part_17.part)

    # Mirror1 copy 13: add mirror1_copy_13_tool
    add(mirror1_copy_13_tool.part)


with BuildPart() as mirror1_copy_14_tool:
    # Mirror1 copy 14 sketch → Mirror1 copy 14 (with draft: the straight prism first)
    with BuildSketch(Plane(origin=(0, -1, 0), x_dir=(1, 0, 0), z_dir=(0, 0, -1))):
        with BuildLine():
            Line((-1.5, -0.125), (-1.5, 0.125))
            Line((-1.5, 0.125), (-1.245, 0.125))
            ThreePointArc((-1.245, 0.125), (-1.12, 0), (-1.245, -0.125))
            Line((-1.245, -0.125), (-1.5, -0.125))
        make_face()
    extrude(amount=-MIRROR1_COPY_14_DEPTH)
    # Mirror1 copy 14: the draft: its side faces are tilted about the plane it starts from
    mirror1_copy_14_sides = [mirror1_copy_14_tool.faces().sort_by_distance(p)[0] for p in [
        (-1.3725, -0.875, 0.1),
        (-1.5, -1, 0.1),
        (-1.3725, -1.125, 0.1),
        (-1.12, -1, 0.1),
    ]]
    draft(mirror1_copy_14_sides, Plane(origin=(0, -1, 0), x_dir=(1, 0, 0), z_dir=(0, 0, -1)), MIRROR1_COPY_14_DRAFT)


with BuildPart() as part_19:
    add(part_18.part)

    # Mirror1 copy 14: add mirror1_copy_14_tool
    add(mirror1_copy_14_tool.part)


with BuildPart() as mirror1_copy_15_tool:
    # Mirror1 copy 15 sketch → Mirror1 copy 15 (with draft: the straight prism first)
    with BuildSketch(Plane(origin=(0, 0, 0), x_dir=(1, 0, 0), z_dir=(0, 0, -1))):
        with BuildLine():
            Line((-1.5, -0.125), (-1.5, 0.125))
            Line((-1.5, 0.125), (-1.245, 0.125))
            ThreePointArc((-1.245, 0.125), (-1.12, 0), (-1.245, -0.125))
            Line((-1.245, -0.125), (-1.5, -0.125))
        make_face()
    extrude(amount=-MIRROR1_COPY_15_DEPTH)
    # Mirror1 copy 15: the draft: its side faces are tilted about the plane it starts from
    mirror1_copy_15_sides = [mirror1_copy_15_tool.faces().sort_by_distance(p)[0] for p in [
        (-1.3725, 0.125, 0.1),
        (-1.5, 0, 0.1),
        (-1.3725, -0.125, 0.1),
        (-1.12, 0, 0.1),
    ]]
    draft(mirror1_copy_15_sides, Plane(origin=(0, 0, 0), x_dir=(1, 0, 0), z_dir=(0, 0, -1)), MIRROR1_COPY_15_DRAFT)


with BuildPart() as part_20:
    add(part_19.part)

    # Mirror1 copy 15: add mirror1_copy_15_tool
    add(mirror1_copy_15_tool.part)


solid = part_20.part
